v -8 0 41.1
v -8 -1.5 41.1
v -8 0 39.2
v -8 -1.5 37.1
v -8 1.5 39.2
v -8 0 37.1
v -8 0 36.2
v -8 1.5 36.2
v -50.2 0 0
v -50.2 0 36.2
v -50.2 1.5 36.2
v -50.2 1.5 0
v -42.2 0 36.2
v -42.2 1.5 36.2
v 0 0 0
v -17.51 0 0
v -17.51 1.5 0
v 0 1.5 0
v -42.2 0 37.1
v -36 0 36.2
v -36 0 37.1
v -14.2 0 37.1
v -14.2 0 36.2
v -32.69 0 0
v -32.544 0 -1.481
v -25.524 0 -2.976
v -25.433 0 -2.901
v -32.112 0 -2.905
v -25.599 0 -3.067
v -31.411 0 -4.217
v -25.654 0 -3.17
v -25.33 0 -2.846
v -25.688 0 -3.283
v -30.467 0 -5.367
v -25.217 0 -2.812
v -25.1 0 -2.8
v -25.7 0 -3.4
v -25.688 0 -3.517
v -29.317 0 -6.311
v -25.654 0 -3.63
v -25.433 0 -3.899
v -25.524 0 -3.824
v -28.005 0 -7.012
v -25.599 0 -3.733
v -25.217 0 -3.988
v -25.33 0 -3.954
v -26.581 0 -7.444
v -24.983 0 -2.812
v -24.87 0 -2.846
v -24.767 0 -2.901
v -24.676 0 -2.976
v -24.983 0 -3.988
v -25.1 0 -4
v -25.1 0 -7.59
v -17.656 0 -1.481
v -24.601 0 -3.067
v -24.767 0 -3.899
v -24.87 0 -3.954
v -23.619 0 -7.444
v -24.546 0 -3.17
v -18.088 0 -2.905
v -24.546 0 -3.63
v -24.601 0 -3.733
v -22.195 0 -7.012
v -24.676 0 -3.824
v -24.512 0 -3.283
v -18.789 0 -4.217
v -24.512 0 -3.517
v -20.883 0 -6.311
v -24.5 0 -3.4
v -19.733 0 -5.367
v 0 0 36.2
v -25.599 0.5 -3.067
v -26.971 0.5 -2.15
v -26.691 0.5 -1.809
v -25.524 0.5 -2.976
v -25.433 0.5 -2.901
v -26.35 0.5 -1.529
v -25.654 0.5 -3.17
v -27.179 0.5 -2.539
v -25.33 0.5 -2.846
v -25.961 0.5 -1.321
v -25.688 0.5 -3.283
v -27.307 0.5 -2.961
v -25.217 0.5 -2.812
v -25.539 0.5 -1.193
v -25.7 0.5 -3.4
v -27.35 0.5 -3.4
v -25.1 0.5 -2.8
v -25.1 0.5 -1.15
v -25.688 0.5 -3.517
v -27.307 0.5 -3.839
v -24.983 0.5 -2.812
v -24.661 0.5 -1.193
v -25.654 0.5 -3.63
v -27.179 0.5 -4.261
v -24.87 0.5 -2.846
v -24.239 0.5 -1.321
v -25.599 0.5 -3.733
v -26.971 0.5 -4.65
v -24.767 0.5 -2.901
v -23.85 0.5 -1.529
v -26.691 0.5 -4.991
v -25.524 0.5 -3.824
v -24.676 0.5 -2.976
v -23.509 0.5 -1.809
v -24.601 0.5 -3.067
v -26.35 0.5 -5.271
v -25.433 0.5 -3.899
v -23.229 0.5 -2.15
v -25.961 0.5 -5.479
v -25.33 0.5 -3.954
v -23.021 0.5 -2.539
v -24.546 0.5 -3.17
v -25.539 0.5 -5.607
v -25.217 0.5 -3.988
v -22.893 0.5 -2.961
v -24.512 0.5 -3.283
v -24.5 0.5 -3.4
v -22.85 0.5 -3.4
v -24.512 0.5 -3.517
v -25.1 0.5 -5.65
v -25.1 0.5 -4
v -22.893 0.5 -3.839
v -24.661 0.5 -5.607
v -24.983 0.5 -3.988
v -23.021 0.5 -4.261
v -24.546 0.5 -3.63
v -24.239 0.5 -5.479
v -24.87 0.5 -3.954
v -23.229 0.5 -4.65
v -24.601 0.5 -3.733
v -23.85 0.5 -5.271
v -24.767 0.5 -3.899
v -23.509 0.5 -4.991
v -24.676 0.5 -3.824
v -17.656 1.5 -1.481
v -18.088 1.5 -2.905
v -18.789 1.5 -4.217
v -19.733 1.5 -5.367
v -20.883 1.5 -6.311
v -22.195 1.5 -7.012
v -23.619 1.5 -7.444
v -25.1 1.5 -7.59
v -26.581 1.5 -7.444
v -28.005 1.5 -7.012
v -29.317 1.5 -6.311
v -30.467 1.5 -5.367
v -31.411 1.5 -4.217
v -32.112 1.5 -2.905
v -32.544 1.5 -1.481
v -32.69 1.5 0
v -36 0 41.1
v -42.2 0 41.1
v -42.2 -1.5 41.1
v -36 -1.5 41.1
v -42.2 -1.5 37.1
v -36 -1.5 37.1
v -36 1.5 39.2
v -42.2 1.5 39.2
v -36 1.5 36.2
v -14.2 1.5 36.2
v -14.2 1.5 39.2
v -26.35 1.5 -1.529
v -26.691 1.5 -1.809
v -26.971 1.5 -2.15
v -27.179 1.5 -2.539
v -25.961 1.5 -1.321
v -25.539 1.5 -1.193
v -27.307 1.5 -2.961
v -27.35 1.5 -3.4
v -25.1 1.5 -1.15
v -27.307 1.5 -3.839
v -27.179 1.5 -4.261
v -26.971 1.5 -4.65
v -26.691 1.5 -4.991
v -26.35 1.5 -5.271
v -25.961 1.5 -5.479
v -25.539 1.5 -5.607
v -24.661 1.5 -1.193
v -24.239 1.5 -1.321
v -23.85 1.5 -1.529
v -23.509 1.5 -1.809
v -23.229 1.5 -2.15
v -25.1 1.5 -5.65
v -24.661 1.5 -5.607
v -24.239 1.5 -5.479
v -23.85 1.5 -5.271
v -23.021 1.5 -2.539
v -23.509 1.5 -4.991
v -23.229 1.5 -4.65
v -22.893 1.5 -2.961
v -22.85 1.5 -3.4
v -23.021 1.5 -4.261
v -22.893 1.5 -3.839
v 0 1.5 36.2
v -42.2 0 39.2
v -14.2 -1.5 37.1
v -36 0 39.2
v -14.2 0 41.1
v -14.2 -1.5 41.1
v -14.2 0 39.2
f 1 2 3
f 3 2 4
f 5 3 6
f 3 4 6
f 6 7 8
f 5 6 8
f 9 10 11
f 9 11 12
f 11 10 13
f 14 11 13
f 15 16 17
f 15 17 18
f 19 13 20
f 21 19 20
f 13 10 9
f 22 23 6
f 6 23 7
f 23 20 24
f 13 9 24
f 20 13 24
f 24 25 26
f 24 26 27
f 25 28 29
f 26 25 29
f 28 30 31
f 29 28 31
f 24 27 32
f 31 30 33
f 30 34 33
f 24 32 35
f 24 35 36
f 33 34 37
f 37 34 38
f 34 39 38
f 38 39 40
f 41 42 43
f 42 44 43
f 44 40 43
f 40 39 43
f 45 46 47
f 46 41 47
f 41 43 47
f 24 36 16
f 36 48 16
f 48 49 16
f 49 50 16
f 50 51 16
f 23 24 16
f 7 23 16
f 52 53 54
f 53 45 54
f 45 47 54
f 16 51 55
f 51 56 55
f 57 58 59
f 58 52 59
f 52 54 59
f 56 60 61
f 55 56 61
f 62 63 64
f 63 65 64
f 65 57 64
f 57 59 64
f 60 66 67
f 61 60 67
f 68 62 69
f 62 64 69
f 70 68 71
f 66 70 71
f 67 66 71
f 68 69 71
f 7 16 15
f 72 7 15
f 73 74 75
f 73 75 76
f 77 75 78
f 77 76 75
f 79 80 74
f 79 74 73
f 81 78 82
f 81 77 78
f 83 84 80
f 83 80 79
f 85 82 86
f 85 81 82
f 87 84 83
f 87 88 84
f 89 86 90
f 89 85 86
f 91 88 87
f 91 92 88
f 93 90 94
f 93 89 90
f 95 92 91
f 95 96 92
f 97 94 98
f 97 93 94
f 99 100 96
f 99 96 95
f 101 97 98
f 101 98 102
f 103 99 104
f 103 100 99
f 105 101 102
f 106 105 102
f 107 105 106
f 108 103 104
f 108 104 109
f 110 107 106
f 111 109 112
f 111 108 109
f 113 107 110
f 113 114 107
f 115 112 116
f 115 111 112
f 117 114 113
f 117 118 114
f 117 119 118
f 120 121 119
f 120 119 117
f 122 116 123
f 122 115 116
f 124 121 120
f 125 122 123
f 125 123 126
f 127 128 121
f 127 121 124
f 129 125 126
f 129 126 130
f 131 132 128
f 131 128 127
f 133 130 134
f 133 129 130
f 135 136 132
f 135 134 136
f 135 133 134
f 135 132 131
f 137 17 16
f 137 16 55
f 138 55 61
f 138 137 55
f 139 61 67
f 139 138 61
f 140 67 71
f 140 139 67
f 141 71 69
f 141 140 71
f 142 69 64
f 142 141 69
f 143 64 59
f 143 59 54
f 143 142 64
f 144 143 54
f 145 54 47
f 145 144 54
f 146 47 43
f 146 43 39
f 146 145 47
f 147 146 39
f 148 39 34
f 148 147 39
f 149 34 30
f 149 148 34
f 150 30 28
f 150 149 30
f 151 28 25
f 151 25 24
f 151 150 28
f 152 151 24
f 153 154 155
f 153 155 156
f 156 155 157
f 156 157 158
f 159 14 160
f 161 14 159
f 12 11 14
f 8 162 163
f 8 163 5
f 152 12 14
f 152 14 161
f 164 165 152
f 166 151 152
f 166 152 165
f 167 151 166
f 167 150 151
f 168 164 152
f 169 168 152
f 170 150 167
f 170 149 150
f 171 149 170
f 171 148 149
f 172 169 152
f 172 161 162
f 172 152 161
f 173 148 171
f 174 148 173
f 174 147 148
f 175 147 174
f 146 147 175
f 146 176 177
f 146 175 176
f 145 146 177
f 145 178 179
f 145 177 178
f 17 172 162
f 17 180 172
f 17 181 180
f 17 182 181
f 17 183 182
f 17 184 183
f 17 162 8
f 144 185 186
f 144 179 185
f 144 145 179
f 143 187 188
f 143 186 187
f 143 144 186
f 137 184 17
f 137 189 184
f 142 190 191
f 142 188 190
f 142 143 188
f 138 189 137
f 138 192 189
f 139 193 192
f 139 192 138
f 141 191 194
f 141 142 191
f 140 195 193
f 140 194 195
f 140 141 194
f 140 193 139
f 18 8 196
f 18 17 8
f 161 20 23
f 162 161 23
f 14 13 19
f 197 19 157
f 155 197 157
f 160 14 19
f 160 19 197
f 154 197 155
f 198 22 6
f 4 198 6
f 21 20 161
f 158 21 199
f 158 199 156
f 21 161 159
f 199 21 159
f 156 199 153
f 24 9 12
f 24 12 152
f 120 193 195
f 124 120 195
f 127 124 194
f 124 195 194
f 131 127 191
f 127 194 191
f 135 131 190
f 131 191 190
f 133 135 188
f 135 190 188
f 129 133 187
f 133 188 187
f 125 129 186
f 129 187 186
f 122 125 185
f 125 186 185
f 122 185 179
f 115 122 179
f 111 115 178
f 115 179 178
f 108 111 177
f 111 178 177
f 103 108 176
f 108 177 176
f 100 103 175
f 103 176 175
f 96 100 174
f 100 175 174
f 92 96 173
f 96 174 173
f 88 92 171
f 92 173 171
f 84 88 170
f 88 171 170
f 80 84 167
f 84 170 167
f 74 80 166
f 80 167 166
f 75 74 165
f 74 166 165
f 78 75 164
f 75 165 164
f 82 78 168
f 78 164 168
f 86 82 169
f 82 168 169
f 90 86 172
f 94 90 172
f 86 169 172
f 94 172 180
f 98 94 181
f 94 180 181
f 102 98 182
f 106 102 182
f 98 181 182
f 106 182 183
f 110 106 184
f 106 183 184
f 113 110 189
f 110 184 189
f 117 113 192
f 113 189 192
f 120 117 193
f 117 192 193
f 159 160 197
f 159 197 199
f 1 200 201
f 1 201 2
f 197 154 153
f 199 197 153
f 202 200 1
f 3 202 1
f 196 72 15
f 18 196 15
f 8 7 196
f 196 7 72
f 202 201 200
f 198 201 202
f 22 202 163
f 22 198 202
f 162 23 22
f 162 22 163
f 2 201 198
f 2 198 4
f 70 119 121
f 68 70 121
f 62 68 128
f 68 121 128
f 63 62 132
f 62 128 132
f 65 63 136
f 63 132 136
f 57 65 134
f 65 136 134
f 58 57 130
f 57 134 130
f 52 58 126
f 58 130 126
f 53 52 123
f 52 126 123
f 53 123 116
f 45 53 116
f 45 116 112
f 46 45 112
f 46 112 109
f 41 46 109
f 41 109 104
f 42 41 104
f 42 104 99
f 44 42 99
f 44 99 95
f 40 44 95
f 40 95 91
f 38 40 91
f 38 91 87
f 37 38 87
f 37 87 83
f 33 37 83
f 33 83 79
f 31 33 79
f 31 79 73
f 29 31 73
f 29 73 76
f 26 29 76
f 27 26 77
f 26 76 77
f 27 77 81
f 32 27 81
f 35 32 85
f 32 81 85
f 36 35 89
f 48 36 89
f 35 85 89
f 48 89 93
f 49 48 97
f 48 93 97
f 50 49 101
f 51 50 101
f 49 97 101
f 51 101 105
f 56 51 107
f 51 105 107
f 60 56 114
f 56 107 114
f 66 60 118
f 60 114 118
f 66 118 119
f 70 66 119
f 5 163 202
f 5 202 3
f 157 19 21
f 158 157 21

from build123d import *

# Parameters (mm, degrees)
SKETCH1_W           = 50.2
SKETCH1_H           = 36.2
BOSS_EXTRUDE1_DEPTH = 1.5
SKETCH2_W           = 6.2
SKETCH2_H           = 1.5
BOSS_EXTRUDE2_DEPTH = 3
BOSS_EXTRUDE3_DEPTH = 1.5
SKETCH5_R           = 2.25
CUT_EXTRUDE1_DEPTH  = 1
SKETCH6_R           = 0.6
CUT_EXTRUDE2_DEPTH  = 1
SKETCH9_W           = 6.2
SKETCH9_H           = 4
BOSS_EXTRUDE4_DEPTH = 1.5


with BuildPart() as part:
    # Sketch1 → Boss-Extrude1 (new body)
    with BuildSketch(Plane(origin=(0, 0, 0), x_dir=(1, 0, 0), z_dir=(0, 1, 0))):
        with Locations((-25.1, -18.1)):
            Rectangle(SKETCH1_W, SKETCH1_H)
    extrude(amount=BOSS_EXTRUDE1_DEPTH)

    # Sketch2 → Boss-Extrude2 (add)
    with BuildSketch(Plane.XY.offset(36.2)):
        with Locations((-39.1, 0.75)):
            Rectangle(SKETCH2_W, SKETCH2_H)
        with Locations((-11.1, 0.75)):
            Rectangle(SKETCH2_W, SKETCH2_H)
    extrude(amount=BOSS_EXTRUDE2_DEPTH)

    # Sketch4 → Boss-Extrude3 (add)
    with BuildSketch(Plane(origin=(0, 1.5, 0), x_dir=(1, 0, 0), z_dir=(0, 1, 0))):
        with BuildLine():
            Line((-32.69, 0), (-17.51, 0))
            ThreePointArc((-17.51, 0), (-25.1, 7.59), (-32.69, 0))
        make_face()
    extrude(amount=-BOSS_EXTRUDE3_DEPTH)

    # Sketch5 → Cut-Extrude1 (cut)
    with BuildSketch(Plane(origin=(0, 1.5, 0), x_dir=(1, 0, 0), z_dir=(0, 1, 0))):
        with Locations((-25.1, 3.4)):
            Circle(SKETCH5_R)
    extrude(amount=-CUT_EXTRUDE1_DEPTH, mode=Mode.SUBTRACT)

    # Sketch6 → Cut-Extrude2 (cut)
    with BuildSketch(Plane(origin=(0, 0.5, 0), x_dir=(1, 0, 0), z_dir=(0, 1, 0))):
        with Locations((-25.1, 3.4)):
            Circle(SKETCH6_R)
    extrude(amount=-CUT_EXTRUDE2_DEPTH, mode=Mode.SUBTRACT)

    # Sketch9 → Boss-Extrude4 (add)
    with BuildSketch(Plane.XZ):
        with Locations((-39.1, 39.1)):
            Rectangle(SKETCH9_W, SKETCH9_H)
        with Locations((-11.1, 39.1)):
            Rectangle(SKETCH9_W, SKETCH9_H)
    extrude(amount=BOSS_EXTRUDE4_DEPTH)


solid = part.part
